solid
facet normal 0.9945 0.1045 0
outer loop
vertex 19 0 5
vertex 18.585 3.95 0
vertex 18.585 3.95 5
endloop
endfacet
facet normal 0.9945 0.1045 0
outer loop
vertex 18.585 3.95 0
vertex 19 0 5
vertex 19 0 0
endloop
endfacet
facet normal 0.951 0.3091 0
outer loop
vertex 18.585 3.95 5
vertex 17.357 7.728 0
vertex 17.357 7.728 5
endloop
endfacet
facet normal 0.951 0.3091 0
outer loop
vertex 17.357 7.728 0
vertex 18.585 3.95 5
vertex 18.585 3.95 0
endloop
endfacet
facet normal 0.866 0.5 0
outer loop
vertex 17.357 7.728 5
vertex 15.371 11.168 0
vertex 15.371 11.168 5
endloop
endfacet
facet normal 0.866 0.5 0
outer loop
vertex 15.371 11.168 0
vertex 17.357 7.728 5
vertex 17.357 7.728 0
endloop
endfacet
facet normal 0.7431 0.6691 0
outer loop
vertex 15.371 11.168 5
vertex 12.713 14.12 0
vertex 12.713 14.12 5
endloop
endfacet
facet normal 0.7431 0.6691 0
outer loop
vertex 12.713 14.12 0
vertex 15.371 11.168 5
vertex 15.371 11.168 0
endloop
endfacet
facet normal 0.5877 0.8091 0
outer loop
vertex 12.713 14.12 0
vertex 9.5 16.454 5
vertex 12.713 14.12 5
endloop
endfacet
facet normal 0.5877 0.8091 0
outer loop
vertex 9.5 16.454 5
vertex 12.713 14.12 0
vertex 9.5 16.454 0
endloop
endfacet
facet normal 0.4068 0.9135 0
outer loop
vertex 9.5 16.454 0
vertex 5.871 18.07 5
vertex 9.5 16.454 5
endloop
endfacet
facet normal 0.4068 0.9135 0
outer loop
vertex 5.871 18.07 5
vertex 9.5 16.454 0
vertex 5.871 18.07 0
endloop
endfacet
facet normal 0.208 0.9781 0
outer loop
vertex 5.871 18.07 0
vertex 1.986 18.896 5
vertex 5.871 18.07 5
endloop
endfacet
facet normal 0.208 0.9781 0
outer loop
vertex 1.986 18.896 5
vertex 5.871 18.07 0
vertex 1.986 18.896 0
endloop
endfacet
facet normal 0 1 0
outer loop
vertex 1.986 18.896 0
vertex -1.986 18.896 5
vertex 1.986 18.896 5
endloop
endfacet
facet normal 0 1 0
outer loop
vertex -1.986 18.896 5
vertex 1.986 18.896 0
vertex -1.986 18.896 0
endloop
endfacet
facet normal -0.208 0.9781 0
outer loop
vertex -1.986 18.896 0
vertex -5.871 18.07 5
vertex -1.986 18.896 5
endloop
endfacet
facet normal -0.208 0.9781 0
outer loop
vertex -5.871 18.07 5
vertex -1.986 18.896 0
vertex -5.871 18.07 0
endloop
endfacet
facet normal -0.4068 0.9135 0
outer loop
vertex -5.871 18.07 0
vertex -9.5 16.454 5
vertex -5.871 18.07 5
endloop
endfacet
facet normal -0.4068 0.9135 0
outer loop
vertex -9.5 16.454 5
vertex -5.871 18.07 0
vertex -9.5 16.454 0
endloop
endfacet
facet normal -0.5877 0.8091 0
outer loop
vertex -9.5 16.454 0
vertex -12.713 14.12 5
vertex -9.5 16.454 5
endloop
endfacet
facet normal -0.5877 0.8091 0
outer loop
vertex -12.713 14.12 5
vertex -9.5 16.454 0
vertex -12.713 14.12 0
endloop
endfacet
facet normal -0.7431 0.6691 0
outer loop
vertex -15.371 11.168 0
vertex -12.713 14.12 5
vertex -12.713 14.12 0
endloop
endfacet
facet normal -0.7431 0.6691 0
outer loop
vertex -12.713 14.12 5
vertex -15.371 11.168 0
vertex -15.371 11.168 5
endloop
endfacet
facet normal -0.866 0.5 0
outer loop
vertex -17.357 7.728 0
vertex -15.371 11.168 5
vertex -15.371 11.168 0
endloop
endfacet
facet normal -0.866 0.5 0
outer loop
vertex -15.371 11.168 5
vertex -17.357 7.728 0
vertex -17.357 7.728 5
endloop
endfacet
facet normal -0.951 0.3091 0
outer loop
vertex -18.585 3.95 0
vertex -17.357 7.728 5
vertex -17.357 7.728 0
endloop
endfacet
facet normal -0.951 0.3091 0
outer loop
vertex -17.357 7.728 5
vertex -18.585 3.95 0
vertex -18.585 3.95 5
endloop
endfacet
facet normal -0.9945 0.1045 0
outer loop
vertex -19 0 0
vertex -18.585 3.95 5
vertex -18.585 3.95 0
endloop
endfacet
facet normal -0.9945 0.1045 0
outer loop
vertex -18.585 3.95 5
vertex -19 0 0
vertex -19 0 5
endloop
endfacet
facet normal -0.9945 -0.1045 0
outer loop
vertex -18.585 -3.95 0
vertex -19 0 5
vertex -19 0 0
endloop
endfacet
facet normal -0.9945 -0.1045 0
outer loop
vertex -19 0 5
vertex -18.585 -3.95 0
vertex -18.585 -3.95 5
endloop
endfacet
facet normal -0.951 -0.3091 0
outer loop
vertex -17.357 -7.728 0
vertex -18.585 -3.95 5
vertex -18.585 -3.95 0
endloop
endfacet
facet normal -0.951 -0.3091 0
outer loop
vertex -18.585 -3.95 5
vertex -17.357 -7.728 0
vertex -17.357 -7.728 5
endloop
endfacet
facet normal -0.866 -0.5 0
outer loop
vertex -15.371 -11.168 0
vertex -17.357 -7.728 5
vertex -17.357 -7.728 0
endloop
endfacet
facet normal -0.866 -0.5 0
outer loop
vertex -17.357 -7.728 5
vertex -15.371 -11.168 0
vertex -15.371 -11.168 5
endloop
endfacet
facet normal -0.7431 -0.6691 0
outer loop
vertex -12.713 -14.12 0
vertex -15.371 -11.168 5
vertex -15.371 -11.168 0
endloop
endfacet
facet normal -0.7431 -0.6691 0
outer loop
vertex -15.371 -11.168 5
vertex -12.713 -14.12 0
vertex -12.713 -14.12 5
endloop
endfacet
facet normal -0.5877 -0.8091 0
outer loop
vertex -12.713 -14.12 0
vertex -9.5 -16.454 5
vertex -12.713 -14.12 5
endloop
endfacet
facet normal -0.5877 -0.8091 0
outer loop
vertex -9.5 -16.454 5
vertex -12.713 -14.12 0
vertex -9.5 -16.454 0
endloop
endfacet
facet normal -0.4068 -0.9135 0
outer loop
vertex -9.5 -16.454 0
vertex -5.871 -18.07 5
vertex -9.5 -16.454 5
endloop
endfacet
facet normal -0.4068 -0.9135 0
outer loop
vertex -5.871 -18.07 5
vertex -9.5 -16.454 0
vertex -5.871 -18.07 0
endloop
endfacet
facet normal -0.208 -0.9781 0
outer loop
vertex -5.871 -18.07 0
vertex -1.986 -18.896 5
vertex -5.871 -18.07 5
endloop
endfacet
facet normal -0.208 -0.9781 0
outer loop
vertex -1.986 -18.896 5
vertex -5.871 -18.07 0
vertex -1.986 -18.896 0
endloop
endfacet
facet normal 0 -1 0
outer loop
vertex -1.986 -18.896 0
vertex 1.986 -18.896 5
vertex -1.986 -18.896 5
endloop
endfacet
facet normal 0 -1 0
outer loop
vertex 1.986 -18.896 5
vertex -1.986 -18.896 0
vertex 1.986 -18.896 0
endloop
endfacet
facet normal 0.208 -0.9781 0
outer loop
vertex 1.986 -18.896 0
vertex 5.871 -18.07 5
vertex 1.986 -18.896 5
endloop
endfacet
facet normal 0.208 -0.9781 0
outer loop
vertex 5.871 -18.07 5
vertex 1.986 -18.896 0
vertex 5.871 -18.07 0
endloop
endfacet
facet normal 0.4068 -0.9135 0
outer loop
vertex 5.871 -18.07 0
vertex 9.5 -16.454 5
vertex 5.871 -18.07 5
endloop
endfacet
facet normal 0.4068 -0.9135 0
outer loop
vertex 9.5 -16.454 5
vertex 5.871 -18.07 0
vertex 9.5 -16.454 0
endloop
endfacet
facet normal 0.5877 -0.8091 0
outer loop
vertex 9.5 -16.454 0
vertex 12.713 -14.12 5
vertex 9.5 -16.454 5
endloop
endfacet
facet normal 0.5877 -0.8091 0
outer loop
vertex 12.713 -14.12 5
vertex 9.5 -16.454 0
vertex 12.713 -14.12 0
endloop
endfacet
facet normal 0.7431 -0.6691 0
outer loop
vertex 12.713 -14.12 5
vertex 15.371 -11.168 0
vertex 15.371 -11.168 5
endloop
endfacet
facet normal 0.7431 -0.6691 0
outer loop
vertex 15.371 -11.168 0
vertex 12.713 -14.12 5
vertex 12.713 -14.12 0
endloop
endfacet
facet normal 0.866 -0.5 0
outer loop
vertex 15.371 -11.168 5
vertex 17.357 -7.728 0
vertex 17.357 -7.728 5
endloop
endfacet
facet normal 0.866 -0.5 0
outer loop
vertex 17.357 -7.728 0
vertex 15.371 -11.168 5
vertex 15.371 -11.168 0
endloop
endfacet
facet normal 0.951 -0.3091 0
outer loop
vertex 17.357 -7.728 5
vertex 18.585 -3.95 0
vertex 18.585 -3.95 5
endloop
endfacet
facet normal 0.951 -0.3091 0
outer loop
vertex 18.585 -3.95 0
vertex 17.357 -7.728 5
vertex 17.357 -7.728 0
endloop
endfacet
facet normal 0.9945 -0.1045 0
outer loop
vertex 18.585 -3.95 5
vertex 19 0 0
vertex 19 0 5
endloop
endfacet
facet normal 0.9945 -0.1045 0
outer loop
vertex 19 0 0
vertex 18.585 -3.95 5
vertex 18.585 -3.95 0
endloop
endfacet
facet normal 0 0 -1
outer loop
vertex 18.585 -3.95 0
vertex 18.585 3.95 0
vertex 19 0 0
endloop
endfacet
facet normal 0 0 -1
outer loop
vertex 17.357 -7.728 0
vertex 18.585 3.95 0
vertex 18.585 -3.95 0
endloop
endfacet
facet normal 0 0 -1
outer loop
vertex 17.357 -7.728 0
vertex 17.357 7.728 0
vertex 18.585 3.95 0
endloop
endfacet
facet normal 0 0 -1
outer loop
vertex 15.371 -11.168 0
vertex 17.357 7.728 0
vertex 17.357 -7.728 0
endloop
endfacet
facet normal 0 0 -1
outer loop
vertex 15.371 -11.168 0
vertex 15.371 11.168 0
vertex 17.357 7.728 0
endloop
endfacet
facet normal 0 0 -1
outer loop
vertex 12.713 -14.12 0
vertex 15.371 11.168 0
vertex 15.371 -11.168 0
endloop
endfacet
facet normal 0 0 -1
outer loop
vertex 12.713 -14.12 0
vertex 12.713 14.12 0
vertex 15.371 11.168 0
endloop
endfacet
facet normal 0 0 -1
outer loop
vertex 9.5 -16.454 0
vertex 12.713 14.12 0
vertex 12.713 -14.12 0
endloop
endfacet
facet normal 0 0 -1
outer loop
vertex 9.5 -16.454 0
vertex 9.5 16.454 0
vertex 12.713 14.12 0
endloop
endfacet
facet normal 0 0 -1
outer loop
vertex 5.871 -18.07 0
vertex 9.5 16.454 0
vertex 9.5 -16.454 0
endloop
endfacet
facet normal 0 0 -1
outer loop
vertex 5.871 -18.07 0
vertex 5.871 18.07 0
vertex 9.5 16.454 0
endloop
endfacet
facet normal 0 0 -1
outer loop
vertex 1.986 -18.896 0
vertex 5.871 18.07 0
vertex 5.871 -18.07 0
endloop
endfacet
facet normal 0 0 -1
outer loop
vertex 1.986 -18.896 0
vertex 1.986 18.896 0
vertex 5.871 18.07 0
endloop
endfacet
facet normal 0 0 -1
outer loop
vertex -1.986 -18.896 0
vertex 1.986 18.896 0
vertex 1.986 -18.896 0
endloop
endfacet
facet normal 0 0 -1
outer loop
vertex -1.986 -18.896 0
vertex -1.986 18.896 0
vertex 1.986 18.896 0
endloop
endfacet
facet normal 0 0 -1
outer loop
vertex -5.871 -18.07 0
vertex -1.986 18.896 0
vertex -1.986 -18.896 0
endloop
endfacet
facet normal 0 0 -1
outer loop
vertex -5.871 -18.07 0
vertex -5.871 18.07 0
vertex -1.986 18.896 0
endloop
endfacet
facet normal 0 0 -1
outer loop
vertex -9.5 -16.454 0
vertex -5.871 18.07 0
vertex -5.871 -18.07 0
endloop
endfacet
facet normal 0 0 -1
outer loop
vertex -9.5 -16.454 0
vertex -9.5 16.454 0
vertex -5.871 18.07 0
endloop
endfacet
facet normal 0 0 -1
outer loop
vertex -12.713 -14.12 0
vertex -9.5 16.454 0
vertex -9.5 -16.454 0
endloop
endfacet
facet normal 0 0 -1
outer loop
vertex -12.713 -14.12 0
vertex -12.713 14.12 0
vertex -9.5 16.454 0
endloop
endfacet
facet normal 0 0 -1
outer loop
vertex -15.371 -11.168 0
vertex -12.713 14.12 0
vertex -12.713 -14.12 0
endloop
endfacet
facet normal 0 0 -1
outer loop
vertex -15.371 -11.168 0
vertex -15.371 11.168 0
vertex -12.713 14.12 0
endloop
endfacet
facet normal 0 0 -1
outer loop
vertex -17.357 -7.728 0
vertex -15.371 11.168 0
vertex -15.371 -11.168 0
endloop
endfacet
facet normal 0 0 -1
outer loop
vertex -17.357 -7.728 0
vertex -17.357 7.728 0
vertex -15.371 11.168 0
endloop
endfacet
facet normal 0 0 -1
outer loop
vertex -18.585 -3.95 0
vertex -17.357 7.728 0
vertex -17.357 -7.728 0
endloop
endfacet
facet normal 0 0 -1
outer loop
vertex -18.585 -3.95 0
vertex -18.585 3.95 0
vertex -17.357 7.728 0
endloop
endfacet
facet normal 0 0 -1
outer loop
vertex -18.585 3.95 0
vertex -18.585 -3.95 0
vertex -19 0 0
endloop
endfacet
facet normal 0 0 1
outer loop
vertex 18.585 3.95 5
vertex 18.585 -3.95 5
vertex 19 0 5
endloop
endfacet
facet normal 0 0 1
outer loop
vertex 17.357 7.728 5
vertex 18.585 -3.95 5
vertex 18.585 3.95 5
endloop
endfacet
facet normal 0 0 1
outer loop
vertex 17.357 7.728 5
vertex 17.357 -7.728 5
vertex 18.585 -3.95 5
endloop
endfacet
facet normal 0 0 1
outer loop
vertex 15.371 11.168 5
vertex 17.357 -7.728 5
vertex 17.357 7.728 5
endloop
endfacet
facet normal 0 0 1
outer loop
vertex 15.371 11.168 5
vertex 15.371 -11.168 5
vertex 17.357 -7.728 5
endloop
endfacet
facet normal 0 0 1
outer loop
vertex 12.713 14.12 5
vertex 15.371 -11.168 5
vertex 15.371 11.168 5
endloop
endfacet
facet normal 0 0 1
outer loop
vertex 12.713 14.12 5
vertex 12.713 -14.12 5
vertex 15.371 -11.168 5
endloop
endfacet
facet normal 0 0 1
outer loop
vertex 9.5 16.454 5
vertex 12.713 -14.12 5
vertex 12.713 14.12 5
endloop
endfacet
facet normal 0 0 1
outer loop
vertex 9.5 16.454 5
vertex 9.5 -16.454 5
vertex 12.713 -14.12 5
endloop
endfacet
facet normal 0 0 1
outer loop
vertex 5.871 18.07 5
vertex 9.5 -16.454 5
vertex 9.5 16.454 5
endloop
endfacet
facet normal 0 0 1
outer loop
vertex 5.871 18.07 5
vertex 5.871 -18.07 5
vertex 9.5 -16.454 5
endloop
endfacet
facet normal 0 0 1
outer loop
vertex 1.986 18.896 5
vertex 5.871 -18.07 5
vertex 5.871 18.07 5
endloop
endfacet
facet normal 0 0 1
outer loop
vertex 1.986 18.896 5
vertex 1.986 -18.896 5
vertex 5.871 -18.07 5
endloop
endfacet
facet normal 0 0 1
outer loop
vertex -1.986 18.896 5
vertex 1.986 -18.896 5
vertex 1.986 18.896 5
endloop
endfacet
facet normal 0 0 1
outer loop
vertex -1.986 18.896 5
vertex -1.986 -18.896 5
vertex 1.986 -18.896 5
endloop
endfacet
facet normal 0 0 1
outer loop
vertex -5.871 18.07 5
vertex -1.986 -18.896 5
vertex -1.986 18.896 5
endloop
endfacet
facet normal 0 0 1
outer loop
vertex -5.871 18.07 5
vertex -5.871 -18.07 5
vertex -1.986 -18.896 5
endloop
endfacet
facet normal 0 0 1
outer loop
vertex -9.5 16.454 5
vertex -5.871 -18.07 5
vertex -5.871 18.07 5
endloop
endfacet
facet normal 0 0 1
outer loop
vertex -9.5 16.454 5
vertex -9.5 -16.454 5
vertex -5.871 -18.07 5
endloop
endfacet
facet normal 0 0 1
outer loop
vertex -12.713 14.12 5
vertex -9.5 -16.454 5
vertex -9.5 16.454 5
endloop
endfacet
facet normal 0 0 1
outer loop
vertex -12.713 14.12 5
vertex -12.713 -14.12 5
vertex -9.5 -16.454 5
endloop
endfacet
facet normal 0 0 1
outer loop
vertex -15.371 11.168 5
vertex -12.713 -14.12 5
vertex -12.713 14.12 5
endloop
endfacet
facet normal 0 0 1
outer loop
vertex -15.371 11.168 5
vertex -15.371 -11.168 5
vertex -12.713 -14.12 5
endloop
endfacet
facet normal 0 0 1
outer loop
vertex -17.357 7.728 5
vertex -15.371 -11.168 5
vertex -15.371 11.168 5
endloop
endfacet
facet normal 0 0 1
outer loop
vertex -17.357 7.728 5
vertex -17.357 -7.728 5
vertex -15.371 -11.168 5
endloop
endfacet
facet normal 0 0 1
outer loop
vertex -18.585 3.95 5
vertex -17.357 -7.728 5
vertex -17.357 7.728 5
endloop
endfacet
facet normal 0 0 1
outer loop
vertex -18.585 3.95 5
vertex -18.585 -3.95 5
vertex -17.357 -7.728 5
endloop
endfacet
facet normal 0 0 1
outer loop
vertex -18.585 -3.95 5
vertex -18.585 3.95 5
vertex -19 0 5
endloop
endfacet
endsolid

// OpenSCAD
// Generated by SolidPython 1.0.1 on 2020-07-29 00:46:44


cylinder(h = 5, r1 = 19, r2 = 19);
/***********************************************
*********      SolidPython code:      **********
************************************************
 
# import packages: SolidPython
from solid import *
from solid.utils import *
from itertools import chain, combinations, permutations


class Resize:

    def __init__(self, scad_file):
        self.scad_file = scad_file
        #self.scad_file = import_scad(scad_file)
        # cone/cylinder param:
        self.r1 = 0
        self.r2 = 0
        self.h = 0
        # rectangular prism param:
        self.w = 0
        self.l = 0
        # ellipse param:
        self.r = 0

    # import OpenScad code (file name corresponds to shape)


    # classify shape + parameters
    def assign(self, param1, param2, param3):
        if self.scad_file == 'cone.scad':
            self.r1 = param1
            self.r2 = param2
            self.h = param3
        elif self.scad_file == 'cylinder.scad':
            self.r1 = param1
            self.r2 = param2
            self.h = param3
        elif self.scad_file == 'rectangularPrism.scad':
            self.h = param1
            self.l = param2
            self.w = param3
        else:
            self.r = param1
            self.h = param2

    # resize parameters
    def iterate(self):
        x = range(3, 20, 2)
        i = 1
        if self.scad_file == 'cone.scad':
            tempList = list(permutations(x, 2))
            for temp in tempList:
                param1 = temp[0]
                param2 = temp[1]
                filepath = 'produced_scad_files/' + 'cone' + str(param1) + '_' + str(param2) + '_' + '.scad'
                scad_render_to_file(cylinder(h=param1, r1=param2, r2=0), filepath)

        elif self.scad_file == 'cylinder.scad':
            tempList = list(permutations(x, 3))
            for temp in tempList:
                param1 = temp[0]
                param2 = temp[1]
                filepath = 'produced_scad_files/' + 'cylinder' + str(param1) + '_' + str(param2) + '_' + '.scad'
                scad_render_to_file(cylinder(h=param1, r1=param2, r2=param2), filepath)

        elif self.scad_file == 'rectangularPrism.scad':
            tempList = list(permutations(x, 3))
            for temp in tempList:
                param1 = temp[0]
                param2 = temp[1]
                param3 = temp[2]
                filepath = 'produced_scad_files/' + 'rectangularPrism' + str(param1) + '_' + str(param2) + '_' + str(
                    param3) + '.scad'
                scad_render_to_file(cube(size=(param1, param2, param3)), filepath)

        elif self.scad_file == 'ellipse.scad':
            tempList = list(permutations(x, 4))
            for temp in tempList:
                param1 = temp[0]
                param2 = temp[1]
                param3 = temp[2]
                param4 = temp[3]
                filepath = 'produced_scad_files/' + 'ellipse' + str(param1) + '_' + str(param2) + '_' + str(param3) + '_' + str(param4) + '.scad'
                scad_render_to_file(scale([param1, param2, param3])(sphere(r=param4)), filepath)

    def render_to_scadfile(self):
        scad_render_to_file(scad, 'example.scad') 
 
************************************************/
